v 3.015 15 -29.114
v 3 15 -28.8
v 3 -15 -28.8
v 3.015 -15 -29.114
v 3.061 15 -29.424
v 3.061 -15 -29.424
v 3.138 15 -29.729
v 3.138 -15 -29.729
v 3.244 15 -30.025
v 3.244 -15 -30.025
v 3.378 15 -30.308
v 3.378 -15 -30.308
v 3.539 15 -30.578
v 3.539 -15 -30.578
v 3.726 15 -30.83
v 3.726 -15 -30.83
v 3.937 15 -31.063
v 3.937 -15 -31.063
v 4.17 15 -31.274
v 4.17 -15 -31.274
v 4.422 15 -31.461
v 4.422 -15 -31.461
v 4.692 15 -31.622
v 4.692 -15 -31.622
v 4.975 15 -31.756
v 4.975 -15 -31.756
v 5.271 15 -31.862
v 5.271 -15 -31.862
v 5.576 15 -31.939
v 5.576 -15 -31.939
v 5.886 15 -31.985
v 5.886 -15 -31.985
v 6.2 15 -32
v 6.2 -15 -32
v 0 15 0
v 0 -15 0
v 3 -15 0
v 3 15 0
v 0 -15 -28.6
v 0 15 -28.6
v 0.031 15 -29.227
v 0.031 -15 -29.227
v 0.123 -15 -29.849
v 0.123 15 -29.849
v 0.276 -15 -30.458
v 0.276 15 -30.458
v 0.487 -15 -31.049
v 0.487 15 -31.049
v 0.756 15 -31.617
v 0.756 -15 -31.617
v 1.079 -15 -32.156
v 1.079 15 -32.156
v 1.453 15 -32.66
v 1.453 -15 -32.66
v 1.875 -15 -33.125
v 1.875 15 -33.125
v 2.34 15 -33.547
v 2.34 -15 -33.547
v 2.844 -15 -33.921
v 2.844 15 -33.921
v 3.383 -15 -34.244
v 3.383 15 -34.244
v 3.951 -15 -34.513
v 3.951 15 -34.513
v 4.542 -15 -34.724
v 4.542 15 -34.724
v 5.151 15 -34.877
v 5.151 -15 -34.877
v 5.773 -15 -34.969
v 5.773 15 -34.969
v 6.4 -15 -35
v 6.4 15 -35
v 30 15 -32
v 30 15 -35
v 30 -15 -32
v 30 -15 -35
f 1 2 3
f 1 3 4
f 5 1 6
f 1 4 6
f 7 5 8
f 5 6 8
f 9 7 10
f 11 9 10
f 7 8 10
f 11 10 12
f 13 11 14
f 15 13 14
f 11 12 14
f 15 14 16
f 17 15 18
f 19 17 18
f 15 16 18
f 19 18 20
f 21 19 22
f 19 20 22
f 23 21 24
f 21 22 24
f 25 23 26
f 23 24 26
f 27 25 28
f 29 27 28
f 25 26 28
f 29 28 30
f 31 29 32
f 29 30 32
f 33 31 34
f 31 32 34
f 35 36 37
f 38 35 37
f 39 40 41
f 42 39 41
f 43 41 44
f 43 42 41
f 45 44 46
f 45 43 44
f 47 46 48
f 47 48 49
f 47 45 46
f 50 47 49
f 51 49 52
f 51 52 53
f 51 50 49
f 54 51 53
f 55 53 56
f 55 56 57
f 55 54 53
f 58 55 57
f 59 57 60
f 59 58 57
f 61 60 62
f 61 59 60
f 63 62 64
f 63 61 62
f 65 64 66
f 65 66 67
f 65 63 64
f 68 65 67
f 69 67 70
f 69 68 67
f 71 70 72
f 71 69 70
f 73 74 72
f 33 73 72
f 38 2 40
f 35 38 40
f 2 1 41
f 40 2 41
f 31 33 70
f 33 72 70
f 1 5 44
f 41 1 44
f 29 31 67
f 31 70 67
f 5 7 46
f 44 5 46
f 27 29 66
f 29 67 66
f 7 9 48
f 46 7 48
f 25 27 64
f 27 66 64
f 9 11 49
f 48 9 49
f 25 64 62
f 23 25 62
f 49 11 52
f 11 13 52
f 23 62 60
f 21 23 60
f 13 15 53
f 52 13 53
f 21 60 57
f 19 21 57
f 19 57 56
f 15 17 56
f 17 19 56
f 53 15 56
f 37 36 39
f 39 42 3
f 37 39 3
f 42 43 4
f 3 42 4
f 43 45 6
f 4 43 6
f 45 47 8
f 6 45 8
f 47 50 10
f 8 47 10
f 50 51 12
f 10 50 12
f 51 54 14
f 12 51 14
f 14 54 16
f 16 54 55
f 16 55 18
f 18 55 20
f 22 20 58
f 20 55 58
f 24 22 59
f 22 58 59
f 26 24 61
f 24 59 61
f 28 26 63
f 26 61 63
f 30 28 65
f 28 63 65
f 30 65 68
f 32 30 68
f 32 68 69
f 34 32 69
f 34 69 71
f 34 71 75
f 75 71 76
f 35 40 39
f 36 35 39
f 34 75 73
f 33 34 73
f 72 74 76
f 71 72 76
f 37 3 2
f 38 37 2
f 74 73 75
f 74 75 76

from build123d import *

# Parameters (mm, degrees)
SKETCH3_W = 3
SKETCH3_H = 30
FILLET1_R = 3.2
FILLET2_R = 6.4


with BuildPart() as part:
    # Sweep1: sweep along a path in Sketch4
    with BuildLine(Plane(origin=(0, 0, 0), x_dir=(1, 0, 0), z_dir=(0, 1, 0))) as sweep1_path:
        Line((0, 0), (0, 35))
        Line((0, 35), (30, 35))
    # Sketch3 → Sweep1 (sweep)
    with BuildSketch(Plane.XY):
        with Locations((1.5, 0)):
            Rectangle(SKETCH3_W, SKETCH3_H)
    sweep(path=sweep1_path.line, transition=Transition.RIGHT)

    # Fillet1
    fillet1_edges = [part.edges().sort_by_distance(p)[0] for p in [
        (3, 0, -32),
    ]]
    fillet(fillet1_edges, radius=FILLET1_R)

    # Fillet2
    fillet2_edges = [part.edges().sort_by_distance(p)[0] for p in [
        (0, 0, -35),
    ]]
    fillet(fillet2_edges, radius=FILLET2_R)


solid = part.part
